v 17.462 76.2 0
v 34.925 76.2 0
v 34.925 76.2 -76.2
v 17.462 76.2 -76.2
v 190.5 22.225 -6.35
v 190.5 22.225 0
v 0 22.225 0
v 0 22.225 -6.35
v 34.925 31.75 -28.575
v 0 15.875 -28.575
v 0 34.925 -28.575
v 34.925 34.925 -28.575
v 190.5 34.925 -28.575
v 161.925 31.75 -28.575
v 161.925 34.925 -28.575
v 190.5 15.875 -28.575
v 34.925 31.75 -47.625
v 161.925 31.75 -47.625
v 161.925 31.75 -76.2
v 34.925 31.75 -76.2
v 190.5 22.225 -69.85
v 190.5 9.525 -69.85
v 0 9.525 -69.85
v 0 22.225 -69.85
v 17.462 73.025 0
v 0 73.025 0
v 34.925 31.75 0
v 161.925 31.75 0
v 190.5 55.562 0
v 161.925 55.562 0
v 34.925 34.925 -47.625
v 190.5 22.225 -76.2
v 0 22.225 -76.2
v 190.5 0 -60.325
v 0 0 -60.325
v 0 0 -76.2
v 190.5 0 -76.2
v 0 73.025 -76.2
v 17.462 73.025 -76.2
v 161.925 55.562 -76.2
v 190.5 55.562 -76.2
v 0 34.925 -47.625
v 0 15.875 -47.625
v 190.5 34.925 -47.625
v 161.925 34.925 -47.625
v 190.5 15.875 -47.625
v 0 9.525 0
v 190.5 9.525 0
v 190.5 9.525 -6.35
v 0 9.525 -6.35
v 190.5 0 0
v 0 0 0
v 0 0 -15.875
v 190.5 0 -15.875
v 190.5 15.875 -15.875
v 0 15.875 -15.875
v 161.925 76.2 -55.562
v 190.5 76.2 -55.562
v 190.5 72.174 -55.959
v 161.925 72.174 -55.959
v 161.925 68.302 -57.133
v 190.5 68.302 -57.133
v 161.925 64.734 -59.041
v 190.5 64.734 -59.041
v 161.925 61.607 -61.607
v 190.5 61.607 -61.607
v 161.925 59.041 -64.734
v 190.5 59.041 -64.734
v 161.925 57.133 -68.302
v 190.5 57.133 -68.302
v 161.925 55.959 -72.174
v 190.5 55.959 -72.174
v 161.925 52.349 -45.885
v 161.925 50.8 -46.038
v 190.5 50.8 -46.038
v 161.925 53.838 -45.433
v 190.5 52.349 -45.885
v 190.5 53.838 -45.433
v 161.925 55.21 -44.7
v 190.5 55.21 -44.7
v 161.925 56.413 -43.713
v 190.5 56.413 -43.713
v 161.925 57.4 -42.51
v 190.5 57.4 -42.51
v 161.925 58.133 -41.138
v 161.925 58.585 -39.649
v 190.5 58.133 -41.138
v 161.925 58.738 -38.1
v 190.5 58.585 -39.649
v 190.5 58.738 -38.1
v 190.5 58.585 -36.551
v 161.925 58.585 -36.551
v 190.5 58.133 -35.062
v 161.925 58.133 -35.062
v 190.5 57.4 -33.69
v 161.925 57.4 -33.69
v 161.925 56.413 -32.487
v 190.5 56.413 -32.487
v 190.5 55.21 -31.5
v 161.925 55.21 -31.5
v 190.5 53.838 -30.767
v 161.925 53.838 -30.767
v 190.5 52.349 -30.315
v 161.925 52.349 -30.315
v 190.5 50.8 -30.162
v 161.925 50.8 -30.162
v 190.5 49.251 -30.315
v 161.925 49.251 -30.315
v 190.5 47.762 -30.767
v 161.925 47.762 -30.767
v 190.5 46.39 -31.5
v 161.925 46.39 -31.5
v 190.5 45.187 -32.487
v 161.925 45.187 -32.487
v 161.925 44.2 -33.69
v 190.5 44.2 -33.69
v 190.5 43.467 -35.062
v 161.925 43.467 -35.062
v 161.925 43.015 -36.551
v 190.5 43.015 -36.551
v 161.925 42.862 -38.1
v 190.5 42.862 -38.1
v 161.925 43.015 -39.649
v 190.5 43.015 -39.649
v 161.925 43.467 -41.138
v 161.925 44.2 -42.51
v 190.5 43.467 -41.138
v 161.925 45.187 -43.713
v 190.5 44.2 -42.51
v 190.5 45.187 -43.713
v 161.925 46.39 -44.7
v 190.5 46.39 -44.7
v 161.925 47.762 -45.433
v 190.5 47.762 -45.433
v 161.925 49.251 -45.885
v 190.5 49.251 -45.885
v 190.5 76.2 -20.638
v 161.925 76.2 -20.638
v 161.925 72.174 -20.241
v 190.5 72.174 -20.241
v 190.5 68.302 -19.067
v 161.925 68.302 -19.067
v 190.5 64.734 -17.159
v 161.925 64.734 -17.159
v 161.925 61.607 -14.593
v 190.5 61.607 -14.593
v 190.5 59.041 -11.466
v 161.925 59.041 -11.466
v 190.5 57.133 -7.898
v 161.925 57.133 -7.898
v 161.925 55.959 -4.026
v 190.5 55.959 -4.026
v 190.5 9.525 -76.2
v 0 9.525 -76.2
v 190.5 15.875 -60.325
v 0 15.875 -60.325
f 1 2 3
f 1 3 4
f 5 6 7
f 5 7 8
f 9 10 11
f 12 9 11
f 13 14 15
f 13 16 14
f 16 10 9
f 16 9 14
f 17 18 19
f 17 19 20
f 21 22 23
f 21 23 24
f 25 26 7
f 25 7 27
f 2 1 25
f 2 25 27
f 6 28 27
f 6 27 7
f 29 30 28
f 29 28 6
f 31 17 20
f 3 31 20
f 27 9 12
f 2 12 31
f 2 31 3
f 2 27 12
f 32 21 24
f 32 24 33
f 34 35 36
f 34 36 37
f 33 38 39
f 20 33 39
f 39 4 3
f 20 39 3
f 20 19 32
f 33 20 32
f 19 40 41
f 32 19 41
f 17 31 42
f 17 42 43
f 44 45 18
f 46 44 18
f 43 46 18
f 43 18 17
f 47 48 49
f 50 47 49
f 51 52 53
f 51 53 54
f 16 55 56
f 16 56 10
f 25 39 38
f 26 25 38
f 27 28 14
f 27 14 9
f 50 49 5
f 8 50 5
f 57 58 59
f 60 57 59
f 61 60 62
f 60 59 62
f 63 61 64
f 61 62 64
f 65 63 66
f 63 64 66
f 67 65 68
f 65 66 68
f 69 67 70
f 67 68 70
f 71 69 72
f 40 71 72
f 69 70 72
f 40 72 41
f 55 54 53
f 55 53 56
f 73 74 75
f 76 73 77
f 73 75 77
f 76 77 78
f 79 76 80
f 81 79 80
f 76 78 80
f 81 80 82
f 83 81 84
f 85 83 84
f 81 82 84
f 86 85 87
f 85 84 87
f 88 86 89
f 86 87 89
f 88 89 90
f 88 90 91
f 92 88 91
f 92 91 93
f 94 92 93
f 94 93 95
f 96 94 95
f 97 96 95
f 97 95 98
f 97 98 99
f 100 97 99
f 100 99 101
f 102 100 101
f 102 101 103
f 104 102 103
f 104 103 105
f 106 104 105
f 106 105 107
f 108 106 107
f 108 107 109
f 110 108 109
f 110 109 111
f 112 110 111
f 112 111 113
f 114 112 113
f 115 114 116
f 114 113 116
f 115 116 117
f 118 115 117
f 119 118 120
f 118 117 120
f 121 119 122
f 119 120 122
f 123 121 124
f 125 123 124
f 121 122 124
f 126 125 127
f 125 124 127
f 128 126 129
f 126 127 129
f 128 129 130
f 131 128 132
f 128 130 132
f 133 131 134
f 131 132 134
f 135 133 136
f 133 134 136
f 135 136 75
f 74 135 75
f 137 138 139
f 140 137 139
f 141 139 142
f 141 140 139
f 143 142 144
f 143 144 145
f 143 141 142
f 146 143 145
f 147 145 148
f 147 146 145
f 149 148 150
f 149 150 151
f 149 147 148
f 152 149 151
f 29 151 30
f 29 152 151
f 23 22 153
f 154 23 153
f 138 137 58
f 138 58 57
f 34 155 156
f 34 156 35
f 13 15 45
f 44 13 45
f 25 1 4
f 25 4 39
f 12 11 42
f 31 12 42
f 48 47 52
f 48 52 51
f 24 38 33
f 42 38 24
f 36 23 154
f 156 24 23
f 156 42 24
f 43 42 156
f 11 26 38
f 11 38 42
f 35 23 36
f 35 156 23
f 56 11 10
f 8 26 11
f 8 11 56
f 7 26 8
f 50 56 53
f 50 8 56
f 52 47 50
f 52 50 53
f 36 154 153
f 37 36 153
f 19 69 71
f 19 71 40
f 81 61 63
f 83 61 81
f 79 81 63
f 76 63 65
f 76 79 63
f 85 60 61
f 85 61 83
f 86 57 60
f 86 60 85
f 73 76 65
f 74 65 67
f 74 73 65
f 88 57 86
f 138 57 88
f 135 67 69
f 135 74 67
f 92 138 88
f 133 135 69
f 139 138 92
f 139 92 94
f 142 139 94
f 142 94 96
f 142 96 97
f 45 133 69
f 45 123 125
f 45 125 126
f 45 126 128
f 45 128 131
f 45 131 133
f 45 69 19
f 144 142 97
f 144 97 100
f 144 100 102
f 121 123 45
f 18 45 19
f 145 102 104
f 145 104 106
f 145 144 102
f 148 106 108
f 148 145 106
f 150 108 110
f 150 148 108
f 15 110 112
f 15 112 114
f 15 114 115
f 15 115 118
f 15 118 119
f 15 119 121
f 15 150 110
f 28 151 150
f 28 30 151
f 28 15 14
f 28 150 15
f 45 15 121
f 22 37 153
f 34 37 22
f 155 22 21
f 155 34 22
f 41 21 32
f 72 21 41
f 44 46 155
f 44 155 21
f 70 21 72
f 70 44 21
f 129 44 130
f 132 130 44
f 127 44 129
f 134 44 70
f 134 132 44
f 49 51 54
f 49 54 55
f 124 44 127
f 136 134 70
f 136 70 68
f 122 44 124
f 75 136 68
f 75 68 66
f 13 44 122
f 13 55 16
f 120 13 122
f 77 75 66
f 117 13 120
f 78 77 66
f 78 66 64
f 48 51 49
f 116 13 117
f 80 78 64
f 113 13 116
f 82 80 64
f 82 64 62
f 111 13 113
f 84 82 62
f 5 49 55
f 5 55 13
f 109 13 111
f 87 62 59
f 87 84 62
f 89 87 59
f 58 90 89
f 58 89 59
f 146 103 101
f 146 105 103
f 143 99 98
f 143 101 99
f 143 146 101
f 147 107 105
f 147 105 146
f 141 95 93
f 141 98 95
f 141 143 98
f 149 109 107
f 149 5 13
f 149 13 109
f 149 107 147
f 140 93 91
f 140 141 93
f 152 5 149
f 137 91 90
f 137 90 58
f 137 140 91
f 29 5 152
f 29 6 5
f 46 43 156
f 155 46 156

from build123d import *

# Parameters (mm, degrees)
EXTRUDE1_DEPTH = 76.2
EXTRUDE2_DEPTH = 28.575
SKETCH4_R      = 7.9375
EXTRUDE3_DEPTH = 76.2
EXTRUDE4_DEPTH = 219.867836833
SKETCH6_W      = 12.7
SKETCH6_H      = 12.7
EXTRUDE5_DEPTH = 219.867836833


with BuildPart() as part:
    # Sketch2 → Extrude1 (new body)
    with BuildSketch(Plane.XY):
        Polygon((17.4625, 76.2), (17.4625, 73.025), (0, 73.025), (0, 0), (190.5, 0), (190.5, 76.2), (161.925, 76.2), (161.925, 31.75), (34.925, 31.75), (34.925, 76.2), align=None)
    extrude(amount=-EXTRUDE1_DEPTH)

    # Sketch3 → Extrude2 (cut)
    with BuildSketch(Plane(origin=(190.5, 0, 0), x_dir=(0, 0, -1), z_dir=(1, 0, 0))):
        with BuildLine():
            Line((0, 55.5625), (0, 76.2))
            Line((0, 76.2), (20.6375, 76.2))
            ThreePointArc((20.6375, 76.2), (14.592916197, 61.607083803), (0, 55.5625))
        make_face()
        with BuildLine():
            Line((76.2, 76.2), (55.5625, 76.2))
            ThreePointArc((55.5625, 76.2), (61.607083803, 61.607083803), (76.2, 55.5625))
            Line((76.2, 55.5625), (76.2, 76.2))
        make_face()
    extrude(amount=-EXTRUDE2_DEPTH, mode=Mode.SUBTRACT)

    # Sketch4 → Extrude3 (cut)
    with BuildSketch(Plane(origin=(190.5, 0, 0), x_dir=(0, 0, -1), z_dir=(1, 0, 0))):
        with Locations((38.1, 50.8)):
            Circle(SKETCH4_R)
    extrude(amount=-EXTRUDE3_DEPTH, mode=Mode.SUBTRACT)

    # Sketch5 → Extrude4 (cut, through all)
    with BuildSketch(Plane(origin=(190.5, 0, 0), x_dir=(0, 0, -1), z_dir=(1, 0, 0))):
        Polygon((15.875, 15.875), (28.575, 15.875), (28.575, 34.925), (47.625, 34.925), (47.625, 15.875), (60.325, 15.875), (60.325, 0), (15.875, 0), align=None)
    extrude(amount=-EXTRUDE4_DEPTH, mode=Mode.SUBTRACT)

    # Sketch6 → Extrude5 (cut, through all)
    with BuildSketch(Plane(origin=(190.5, 0, 0), x_dir=(0, 0, -1), z_dir=(1, 0, 0))):
        with Locations((0, 15.875)):
            Rectangle(SKETCH6_W, SKETCH6_H)
        with Locations((76.2, 15.875)):
            Rectangle(SKETCH6_W, SKETCH6_H)
    extrude(amount=-EXTRUDE5_DEPTH, mode=Mode.SUBTRACT)


solid = part.part
